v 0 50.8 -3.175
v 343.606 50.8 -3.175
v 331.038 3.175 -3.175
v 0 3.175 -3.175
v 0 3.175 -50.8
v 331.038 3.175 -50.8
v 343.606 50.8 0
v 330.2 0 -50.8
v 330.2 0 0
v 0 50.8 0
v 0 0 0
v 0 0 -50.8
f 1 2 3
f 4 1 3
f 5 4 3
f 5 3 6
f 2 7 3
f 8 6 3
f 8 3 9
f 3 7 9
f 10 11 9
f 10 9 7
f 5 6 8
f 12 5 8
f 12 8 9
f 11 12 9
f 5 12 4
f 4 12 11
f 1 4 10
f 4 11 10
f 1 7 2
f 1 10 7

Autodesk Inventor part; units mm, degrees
ref_plane "YZ Plane" through (0, 0, 0) normal (1, 0, 0) x (0, 1, 0)
ref_plane "XZ Plane" through (0, 0, 0) normal (0, 1, 0) x (-1, 0, 0)
ref_plane "XY Plane" through (0, 0, 0) normal (0, 0, 1) x (1, 0, 0)
sketch "Sketch1" plane through (0, 0, 0) normal (1, 0, 0) x (0, 1, 0)
  line L0 (0, 0) -> (50.8, 0)
  line L1 (50.8, 0) -> (50.8, -3.175)
  line L2 (50.8, -3.175) -> (3.175, -3.175)
  line L3 (3.175, -3.175) -> (3.175, -50.8)
  line L4 (3.175, -50.8) -> (0, -50.8)
  line L5 (0, -50.8) -> (0, 0)
  dimension "d1" = 50.8
  dimension "d2" = 3.175
  dimension "d3" = 47.625
  dimension "d4" = 47.625
  dimension "d5" = 3.175
extrude "Extrusion1" add sketch "Sketch1" along normal blind 381
sketch "Sketch2" plane through (0, 0, 0) normal (0, 0, 1) x (1, 0, 0)
  line L0 (381, 0) -> (330.2, 0)
  line L1 (0, 0) -> (381, 0) projected
  line L2 (330.2, 1828.8) -> (812.8, 1828.8)
  line L3 (343.6056, 50.8) -> (330.2, 0)
  line L4 (381, 0) -> (381, 50.8)
  line L5 (381, 50.8) -> (381, 0) projected
  line L6 (381, 50.8) -> (343.6056, 50.8)
  line L7 (0, 50.8) -> (381, 50.8) projected
  dimension "d9" = 50.8
  dimension "d10" = 1828.8
  dimension "d11" = 482.6
extrude "Extrusion2" cut sketch "Sketch2" against normal blind 381
properties part number "Top Frame Left"
